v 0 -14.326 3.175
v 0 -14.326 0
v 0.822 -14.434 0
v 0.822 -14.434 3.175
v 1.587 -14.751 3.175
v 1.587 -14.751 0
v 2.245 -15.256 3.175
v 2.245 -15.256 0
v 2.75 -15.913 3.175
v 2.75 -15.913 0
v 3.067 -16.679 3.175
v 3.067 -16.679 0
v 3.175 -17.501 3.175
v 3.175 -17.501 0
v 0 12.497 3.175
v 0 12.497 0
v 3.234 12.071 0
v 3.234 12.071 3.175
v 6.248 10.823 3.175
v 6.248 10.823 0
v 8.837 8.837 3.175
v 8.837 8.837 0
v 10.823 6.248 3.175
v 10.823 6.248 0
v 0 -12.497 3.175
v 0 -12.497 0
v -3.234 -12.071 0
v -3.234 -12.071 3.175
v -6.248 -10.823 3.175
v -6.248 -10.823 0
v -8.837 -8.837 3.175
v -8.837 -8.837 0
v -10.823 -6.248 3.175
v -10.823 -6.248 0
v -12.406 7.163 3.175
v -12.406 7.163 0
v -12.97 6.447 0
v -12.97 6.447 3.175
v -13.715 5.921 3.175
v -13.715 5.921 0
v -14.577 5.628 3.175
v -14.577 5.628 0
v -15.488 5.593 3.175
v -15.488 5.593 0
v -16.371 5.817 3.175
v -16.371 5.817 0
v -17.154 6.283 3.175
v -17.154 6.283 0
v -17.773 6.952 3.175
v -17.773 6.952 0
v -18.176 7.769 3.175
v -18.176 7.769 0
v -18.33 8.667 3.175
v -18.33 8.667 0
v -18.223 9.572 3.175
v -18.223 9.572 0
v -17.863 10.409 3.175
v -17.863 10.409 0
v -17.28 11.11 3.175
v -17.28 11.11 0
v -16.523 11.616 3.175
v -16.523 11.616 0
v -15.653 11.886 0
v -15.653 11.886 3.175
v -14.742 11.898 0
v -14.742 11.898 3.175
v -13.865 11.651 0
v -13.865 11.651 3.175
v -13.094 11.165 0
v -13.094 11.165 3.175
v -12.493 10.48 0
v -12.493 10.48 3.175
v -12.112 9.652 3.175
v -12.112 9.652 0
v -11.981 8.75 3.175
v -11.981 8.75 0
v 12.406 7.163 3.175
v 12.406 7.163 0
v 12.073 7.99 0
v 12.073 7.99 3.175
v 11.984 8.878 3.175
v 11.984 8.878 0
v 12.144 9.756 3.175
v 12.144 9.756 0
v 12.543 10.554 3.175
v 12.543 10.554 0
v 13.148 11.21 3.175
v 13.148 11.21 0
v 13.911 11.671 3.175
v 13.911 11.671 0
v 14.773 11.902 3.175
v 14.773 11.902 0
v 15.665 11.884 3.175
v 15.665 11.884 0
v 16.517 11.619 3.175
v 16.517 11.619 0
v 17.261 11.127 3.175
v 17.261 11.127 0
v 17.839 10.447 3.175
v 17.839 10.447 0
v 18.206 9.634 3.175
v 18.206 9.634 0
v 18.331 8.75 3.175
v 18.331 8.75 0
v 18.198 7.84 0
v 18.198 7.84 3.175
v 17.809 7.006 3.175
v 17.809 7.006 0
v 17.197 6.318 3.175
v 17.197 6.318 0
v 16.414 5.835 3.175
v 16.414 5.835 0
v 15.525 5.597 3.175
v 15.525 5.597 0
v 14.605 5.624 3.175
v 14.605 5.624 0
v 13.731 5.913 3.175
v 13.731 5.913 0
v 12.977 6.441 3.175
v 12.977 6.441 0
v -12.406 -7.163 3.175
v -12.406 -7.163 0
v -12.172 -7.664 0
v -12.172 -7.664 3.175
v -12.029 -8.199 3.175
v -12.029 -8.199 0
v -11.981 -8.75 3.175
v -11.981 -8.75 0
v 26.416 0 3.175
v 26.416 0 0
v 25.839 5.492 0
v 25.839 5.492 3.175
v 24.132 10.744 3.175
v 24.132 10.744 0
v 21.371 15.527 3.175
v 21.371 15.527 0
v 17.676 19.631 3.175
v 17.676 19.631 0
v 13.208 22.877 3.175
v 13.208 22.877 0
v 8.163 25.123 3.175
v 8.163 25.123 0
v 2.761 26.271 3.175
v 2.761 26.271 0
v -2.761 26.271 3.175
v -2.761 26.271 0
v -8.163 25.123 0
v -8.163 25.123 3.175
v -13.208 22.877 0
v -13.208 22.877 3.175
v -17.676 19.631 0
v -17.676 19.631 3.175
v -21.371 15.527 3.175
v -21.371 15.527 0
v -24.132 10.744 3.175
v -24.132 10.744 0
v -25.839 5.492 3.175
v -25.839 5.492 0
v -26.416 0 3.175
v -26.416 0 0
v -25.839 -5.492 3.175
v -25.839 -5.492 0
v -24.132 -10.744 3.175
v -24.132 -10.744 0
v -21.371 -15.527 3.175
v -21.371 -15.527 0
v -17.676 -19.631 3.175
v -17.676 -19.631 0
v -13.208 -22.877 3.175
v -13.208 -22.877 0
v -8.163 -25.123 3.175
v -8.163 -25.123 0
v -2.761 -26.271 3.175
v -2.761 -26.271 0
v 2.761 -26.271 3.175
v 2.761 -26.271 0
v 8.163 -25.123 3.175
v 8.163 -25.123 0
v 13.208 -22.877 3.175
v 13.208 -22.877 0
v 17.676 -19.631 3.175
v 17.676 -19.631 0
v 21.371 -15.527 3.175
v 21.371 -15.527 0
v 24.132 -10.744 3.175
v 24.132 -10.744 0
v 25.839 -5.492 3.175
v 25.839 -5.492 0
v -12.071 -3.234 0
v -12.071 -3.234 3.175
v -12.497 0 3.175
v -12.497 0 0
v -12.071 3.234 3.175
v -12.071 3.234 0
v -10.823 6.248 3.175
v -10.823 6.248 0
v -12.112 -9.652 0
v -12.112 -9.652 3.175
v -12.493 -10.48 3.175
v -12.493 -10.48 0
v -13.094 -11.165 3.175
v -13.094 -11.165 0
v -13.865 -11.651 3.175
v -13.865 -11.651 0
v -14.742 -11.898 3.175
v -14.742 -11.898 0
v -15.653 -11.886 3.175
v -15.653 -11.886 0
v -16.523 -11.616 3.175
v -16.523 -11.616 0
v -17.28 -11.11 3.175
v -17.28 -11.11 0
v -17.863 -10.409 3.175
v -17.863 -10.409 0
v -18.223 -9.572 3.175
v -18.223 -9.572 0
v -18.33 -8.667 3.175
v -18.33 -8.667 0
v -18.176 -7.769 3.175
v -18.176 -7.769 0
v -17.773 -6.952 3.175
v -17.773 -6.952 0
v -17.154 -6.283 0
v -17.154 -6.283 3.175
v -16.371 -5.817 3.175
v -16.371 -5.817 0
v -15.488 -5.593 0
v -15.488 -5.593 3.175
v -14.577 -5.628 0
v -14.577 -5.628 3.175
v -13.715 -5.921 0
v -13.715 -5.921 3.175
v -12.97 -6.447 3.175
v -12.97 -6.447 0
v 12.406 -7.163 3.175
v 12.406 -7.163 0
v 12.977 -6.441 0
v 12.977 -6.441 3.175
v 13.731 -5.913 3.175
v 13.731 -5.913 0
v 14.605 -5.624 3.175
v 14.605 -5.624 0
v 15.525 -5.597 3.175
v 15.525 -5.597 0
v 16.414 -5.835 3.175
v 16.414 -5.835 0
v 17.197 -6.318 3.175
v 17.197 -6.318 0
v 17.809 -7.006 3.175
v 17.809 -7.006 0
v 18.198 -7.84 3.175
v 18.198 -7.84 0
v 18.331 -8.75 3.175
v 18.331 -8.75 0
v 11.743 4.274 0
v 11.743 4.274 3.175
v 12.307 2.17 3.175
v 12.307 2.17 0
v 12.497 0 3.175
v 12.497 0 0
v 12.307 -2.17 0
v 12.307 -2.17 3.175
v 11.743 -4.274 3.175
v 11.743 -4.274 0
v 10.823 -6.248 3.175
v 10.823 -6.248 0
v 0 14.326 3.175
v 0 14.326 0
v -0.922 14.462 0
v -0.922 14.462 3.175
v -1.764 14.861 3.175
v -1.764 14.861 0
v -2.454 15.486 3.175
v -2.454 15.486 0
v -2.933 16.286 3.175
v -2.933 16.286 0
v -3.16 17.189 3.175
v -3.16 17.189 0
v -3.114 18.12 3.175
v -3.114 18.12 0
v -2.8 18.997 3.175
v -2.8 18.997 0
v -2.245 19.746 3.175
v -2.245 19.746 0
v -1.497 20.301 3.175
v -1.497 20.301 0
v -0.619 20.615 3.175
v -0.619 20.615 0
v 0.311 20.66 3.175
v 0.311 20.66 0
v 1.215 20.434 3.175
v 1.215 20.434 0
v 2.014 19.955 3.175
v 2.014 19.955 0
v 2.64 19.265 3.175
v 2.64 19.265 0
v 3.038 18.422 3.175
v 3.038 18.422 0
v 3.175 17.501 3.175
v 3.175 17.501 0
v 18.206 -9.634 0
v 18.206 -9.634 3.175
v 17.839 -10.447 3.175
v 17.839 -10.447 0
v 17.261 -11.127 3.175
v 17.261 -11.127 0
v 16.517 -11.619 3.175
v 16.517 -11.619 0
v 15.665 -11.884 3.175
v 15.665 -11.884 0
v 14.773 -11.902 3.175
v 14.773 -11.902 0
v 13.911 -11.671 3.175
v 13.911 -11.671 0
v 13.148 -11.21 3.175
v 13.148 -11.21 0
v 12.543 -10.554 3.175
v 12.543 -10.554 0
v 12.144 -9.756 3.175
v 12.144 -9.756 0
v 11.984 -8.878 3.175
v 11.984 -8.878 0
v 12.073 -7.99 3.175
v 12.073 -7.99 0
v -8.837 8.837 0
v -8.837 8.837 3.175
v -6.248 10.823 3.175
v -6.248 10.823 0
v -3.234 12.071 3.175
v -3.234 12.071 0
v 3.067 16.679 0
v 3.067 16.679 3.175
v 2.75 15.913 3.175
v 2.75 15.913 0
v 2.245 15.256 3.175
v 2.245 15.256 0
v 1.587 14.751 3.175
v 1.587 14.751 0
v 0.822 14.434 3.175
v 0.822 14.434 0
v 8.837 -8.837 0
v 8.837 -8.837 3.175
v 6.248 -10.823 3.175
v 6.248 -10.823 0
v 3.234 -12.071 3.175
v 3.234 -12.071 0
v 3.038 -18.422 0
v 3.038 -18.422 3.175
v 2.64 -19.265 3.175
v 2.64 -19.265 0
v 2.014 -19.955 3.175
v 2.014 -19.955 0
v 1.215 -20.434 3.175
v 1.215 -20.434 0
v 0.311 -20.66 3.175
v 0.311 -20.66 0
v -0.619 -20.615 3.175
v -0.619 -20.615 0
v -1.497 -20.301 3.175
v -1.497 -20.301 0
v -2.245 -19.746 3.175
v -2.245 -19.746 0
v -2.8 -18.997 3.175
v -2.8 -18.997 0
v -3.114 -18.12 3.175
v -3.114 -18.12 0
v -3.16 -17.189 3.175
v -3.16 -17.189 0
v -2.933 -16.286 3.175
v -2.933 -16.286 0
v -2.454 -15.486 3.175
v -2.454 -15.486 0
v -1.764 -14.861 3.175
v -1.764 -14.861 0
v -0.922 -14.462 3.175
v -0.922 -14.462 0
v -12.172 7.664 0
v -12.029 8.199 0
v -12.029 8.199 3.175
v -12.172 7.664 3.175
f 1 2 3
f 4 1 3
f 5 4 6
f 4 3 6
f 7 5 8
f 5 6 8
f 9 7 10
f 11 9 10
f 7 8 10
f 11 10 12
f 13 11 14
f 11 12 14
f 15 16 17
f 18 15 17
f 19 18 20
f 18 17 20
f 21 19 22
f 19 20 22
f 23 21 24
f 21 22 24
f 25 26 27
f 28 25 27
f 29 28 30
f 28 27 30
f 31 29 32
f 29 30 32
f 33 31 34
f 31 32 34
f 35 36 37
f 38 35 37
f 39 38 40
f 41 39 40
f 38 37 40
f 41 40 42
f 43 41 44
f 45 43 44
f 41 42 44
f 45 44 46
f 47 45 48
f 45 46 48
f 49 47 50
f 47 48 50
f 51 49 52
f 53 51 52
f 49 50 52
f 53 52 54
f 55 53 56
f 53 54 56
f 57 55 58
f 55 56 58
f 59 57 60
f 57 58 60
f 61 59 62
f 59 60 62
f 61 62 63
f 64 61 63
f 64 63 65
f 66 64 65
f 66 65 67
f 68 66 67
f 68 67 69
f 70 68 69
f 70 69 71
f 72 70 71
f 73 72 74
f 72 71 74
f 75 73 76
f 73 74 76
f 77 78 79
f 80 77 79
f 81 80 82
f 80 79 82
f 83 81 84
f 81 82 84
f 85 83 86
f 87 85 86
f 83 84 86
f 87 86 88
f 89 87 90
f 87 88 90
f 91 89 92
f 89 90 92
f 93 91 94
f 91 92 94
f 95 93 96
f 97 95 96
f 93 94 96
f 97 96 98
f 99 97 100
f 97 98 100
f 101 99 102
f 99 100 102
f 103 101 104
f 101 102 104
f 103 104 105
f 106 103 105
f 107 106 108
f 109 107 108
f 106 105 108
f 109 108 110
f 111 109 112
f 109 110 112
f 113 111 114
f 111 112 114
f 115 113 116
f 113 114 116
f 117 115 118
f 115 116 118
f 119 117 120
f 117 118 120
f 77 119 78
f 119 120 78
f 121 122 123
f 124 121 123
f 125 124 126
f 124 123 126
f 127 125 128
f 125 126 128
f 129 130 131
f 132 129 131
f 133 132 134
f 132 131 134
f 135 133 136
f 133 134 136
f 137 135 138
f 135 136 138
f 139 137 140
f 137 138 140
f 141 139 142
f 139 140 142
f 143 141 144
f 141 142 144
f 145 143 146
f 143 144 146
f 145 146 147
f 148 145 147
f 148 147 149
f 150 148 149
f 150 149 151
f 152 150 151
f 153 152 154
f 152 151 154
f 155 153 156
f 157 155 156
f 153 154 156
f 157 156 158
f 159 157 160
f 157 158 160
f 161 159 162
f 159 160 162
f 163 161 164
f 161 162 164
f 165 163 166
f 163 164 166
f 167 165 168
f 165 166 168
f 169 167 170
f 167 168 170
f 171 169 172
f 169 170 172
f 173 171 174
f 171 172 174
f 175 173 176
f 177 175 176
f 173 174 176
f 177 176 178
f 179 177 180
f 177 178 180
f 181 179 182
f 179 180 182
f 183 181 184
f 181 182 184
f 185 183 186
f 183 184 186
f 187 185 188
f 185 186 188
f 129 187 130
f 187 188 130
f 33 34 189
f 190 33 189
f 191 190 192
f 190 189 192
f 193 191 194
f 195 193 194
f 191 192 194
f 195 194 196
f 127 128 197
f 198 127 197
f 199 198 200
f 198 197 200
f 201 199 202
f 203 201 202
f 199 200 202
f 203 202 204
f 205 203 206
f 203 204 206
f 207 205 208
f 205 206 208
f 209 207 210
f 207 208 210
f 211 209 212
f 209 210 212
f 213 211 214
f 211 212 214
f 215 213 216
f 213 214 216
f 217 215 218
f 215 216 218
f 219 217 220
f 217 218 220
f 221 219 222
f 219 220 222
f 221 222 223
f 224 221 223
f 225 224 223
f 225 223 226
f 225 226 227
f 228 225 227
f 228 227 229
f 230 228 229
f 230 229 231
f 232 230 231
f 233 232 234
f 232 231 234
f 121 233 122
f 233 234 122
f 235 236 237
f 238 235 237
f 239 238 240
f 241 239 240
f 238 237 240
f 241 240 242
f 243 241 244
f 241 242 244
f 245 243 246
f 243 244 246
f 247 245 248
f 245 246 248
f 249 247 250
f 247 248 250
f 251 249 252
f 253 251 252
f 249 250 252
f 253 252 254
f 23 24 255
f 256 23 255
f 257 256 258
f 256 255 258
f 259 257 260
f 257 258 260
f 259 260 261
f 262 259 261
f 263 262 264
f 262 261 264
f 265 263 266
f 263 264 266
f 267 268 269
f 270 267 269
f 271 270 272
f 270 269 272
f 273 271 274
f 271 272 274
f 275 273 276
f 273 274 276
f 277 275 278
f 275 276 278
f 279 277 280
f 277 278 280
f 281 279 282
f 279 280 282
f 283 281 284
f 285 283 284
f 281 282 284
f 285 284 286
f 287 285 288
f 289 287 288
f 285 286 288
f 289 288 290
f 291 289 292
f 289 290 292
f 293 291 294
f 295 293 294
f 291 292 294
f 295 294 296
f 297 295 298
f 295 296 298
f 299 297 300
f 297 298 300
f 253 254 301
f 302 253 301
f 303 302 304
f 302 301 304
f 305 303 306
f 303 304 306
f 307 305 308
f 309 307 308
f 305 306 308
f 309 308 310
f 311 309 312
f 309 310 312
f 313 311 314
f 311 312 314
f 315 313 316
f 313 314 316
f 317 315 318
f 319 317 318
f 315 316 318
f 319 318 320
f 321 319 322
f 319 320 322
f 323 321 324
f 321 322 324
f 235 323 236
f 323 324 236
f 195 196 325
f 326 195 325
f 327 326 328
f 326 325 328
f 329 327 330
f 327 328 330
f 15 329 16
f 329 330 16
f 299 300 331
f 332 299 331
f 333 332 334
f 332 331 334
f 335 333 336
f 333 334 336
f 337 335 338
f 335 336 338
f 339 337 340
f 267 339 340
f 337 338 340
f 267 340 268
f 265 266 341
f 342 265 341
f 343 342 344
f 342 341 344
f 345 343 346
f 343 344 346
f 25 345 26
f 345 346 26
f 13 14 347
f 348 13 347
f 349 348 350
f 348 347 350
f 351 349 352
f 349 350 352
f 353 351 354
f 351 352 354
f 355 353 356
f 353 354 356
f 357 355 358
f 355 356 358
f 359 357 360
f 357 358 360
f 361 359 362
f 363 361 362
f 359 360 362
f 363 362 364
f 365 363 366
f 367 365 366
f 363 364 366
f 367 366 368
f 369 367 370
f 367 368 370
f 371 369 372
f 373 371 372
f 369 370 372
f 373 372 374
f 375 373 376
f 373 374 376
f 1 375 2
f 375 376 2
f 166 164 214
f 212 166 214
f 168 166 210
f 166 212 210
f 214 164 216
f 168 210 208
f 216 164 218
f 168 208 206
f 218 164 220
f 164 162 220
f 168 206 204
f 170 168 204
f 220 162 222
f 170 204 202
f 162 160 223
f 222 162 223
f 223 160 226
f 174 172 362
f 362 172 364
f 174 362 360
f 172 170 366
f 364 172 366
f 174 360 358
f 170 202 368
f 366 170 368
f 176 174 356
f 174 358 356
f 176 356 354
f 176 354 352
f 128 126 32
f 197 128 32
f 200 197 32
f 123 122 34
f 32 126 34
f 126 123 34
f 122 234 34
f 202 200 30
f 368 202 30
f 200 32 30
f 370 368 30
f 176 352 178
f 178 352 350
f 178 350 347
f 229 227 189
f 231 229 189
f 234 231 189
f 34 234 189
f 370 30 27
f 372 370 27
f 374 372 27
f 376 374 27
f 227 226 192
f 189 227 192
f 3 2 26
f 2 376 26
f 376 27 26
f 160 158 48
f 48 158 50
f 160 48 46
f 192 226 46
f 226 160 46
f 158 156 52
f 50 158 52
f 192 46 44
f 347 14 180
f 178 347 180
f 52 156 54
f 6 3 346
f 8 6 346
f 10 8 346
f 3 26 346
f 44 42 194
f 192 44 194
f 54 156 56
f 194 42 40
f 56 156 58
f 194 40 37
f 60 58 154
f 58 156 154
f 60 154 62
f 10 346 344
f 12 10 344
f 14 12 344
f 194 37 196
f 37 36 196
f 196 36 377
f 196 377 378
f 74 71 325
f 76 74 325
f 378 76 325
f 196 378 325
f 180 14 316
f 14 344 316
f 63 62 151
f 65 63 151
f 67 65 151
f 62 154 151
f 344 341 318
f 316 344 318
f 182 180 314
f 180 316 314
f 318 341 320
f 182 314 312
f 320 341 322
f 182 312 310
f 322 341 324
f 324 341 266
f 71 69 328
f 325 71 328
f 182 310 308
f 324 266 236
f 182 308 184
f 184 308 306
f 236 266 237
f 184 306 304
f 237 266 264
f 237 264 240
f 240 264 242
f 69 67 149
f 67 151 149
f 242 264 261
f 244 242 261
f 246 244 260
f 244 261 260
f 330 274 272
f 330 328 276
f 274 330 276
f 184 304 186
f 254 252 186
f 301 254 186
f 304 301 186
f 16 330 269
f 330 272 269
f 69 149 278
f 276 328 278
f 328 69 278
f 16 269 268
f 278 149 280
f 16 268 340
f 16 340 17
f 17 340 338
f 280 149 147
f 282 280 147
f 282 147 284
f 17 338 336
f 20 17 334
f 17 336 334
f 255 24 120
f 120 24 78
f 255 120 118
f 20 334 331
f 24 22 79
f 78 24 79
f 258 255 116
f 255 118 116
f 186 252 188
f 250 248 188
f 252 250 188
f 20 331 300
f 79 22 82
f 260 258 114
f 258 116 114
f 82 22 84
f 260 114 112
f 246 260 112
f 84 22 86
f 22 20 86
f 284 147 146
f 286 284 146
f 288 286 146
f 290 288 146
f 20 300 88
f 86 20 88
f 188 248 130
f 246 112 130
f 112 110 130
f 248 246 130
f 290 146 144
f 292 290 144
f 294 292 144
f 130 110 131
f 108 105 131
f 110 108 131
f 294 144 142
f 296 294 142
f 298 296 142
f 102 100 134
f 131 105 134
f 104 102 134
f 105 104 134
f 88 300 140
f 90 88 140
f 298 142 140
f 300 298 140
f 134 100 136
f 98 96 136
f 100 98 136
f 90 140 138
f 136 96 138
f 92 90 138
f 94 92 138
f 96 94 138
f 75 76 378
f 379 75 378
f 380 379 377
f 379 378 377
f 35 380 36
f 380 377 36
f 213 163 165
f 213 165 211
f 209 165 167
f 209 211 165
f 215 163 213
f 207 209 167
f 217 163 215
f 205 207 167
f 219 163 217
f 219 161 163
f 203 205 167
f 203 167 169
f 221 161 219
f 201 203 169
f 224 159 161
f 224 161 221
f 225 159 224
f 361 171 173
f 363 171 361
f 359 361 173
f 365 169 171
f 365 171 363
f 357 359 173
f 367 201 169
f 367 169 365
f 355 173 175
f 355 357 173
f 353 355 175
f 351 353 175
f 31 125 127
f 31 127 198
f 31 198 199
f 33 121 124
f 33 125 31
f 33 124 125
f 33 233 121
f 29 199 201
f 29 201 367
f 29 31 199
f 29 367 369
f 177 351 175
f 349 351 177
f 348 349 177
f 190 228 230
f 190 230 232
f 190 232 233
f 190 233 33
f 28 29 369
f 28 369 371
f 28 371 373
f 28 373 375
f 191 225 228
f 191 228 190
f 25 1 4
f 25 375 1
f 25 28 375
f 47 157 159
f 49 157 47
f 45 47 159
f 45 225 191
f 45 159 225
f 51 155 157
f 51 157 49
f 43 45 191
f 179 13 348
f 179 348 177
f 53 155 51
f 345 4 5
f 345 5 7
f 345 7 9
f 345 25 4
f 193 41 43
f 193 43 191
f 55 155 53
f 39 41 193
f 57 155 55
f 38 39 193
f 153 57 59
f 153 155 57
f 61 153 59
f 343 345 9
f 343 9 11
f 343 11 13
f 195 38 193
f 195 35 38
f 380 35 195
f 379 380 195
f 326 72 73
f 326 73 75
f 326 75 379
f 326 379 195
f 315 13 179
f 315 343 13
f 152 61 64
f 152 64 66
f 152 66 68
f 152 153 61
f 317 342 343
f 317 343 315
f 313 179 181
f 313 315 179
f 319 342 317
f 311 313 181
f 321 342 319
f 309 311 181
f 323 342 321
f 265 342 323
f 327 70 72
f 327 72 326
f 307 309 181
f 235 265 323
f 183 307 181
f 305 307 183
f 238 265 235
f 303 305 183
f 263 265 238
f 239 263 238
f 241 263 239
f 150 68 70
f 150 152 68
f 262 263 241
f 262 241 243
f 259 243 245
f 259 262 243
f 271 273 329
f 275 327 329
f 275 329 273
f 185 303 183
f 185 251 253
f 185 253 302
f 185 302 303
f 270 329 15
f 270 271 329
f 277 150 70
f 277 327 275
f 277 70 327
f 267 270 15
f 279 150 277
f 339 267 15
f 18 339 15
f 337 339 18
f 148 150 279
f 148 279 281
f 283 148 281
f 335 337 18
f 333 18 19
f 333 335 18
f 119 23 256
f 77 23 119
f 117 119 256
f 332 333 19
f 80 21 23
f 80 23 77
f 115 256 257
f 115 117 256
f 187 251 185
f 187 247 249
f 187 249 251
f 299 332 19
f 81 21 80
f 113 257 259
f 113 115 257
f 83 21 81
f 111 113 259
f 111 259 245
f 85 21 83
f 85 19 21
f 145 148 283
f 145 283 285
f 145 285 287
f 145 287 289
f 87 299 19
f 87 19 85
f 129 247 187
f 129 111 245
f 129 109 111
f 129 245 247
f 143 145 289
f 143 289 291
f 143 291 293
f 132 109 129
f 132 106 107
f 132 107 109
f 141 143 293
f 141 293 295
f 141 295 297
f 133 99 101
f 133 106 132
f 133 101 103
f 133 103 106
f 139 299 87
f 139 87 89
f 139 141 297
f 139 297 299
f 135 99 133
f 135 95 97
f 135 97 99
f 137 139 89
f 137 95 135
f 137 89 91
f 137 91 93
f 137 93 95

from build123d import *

# Parameters (mm, degrees)
F0_R     = 26.416
F1_DEPTH = 3.175


with BuildPart() as f1:
    # F0 (on Top) → F1 (new body)
    with BuildSketch(Plane.XY):
        Circle(F0_R)
        with BuildLine():
            ThreePointArc((-11.980964, -8.7503), (-18.222779, -9.57205), (-12.406334, -7.1628))
            ThreePointArc((-12.406334, -7.1628), (-12.08915, -7.92855), (-11.980964, -8.7503))
        make_face(mode=Mode.SUBTRACT)
        with BuildLine():
            ThreePointArc((3.175, -17.5006), (-2.245064, -19.745664), (0, -14.3256))
            ThreePointArc((0, -14.3256), (2.245064, -15.255536), (3.175, -17.5006))
        make_face(mode=Mode.SUBTRACT)
        with BuildLine():
            ThreePointArc((18.330964, -8.7503), (14.334214, -11.817114), (12.406334, -7.1628))
            ThreePointArc((12.406334, -7.1628), (15.977715, -5.683486), (18.330964, -8.7503))
        make_face(mode=Mode.SUBTRACT)
        with BuildLine():
            ThreePointArc((-11.980964, 8.7503), (-12.08915, 7.92855), (-12.406334, 7.1628))
            ThreePointArc((-12.406334, 7.1628), (-18.222779, 9.57205), (-11.980964, 8.7503))
        make_face(mode=Mode.SUBTRACT)
        with BuildLine():
            ThreePointArc((10.822546, 6.2484), (12.070982, 3.23441), (12.4968, 0))
            ThreePointArc((12.4968, 0), (12.070982, -3.23441), (10.822546, -6.2484))
            ThreePointArc((10.822546, -6.2484), (6.2484, -10.822546), (0, -12.4968))
            ThreePointArc((0, -12.4968), (-6.2484, -10.822546), (-10.822546, -6.2484))
            ThreePointArc((-10.822546, -6.2484), (-12.4968, 0), (-10.822546, 6.2484))
            ThreePointArc((-10.822546, 6.2484), (-6.2484, 10.822546), (0, 12.4968))
            ThreePointArc((0, 12.4968), (6.2484, 10.822546), (10.822546, 6.2484))
        make_face(mode=Mode.SUBTRACT)
        with BuildLine():
            ThreePointArc((18.330964, 8.7503), (15.977715, 5.683486), (12.406334, 7.1628))
            ThreePointArc((12.406334, 7.1628), (14.334214, 11.817114), (18.330964, 8.7503))
        make_face(mode=Mode.SUBTRACT)
        with BuildLine():
            ThreePointArc((3.175, 17.5006), (2.245064, 15.255536), (0, 14.3256))
            ThreePointArc((0, 14.3256), (-2.245064, 19.745664), (3.175, 17.5006))
        make_face(mode=Mode.SUBTRACT)
    extrude(amount=F1_DEPTH)


solid = f1.part
